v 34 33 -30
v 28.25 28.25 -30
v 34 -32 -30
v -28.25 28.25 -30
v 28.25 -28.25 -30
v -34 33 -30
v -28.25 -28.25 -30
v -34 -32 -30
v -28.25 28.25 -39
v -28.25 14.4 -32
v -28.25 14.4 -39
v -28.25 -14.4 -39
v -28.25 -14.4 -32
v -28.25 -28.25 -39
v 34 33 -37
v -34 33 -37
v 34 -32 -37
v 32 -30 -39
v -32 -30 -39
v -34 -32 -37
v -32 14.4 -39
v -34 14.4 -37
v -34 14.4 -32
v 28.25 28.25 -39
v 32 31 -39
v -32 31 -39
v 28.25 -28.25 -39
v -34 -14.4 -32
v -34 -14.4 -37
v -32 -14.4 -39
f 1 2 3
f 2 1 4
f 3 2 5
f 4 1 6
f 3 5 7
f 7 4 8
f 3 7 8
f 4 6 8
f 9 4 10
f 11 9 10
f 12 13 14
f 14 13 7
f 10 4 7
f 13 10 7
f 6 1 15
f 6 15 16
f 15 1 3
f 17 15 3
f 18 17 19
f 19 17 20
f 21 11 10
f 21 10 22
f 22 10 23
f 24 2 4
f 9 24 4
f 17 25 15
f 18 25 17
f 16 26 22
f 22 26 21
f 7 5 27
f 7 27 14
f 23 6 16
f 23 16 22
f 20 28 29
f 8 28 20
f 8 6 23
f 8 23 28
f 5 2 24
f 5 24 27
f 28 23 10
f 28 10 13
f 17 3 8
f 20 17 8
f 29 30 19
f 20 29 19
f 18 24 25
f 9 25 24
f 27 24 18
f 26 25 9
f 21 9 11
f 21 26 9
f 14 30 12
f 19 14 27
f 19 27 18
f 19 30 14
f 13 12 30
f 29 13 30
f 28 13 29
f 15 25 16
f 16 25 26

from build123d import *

# Parameters (mm, degrees)
BOX331_W                    = 28.8
BOX331_H                    = 43.38
BOX331_DEPTH                = 20
BOX325_W                    = 56.5
BOX325_H                    = 56.5
BOX325_DEPTH                = 40
BOX327_W                    = 65
BOX327_H                    = 68
BOX327_DEPTH                = 9
COMPOUND928_ROLL_ANGLE      = 180
COMPOUND928_PLACEMENT_ANGLE = -90
CHAMFER013_SIZE             = 2


with BuildPart() as krychle331:
    # Box331 → Box331 (new body)
    with BuildSketch(Plane(origin=(-14.4, -8, 34), x_dir=(1, 0, 0), z_dir=(0, 0, 1))):
        with Locations((14.4, 21.69)):
            Rectangle(BOX331_W, BOX331_H)
    extrude(amount=BOX331_DEPTH)


with BuildPart() as krychle325:
    # Box325 → Box325 (new body)
    with BuildSketch(Plane(origin=(-28.25, -28.25, 32), x_dir=(1, 0, 0), z_dir=(0, 0, 1))):
        with Locations((28.25, 28.25)):
            Rectangle(BOX325_W, BOX325_H)
    extrude(amount=BOX325_DEPTH)


with BuildPart() as chamfer013:
    # Box327 → Box327 (new body)
    with BuildSketch(Plane(origin=(-33, -34, 32), x_dir=(1, 0, 0), z_dir=(0, 0, 1))):
        with Locations((32.5, 34)):
            Rectangle(BOX327_W, BOX327_H)
    extrude(amount=BOX327_DEPTH)

    # Cut313: cut Krychle325
    add(krychle325.part, mode=Mode.SUBTRACT)

    # Cut316: cut Krychle331
    add(krychle331.part, mode=Mode.SUBTRACT)


with BuildPart() as chamfer013_1:
    # Cut316 placement: moved
    add(chamfer013.part.moved(Location((-29, 18, 30))))


with BuildPart() as chamfer013_2:
    # Compound928 roll: moved
    add(chamfer013_1.part.rotate(Axis((0, 0, 0), (1, 0, 0)), COMPOUND928_ROLL_ANGLE))


with BuildPart() as chamfer013_3:
    # Compound928 placement: moved
    add(chamfer013_2.part.moved(Location((18, -29, 32))).rotate(Axis((18, -29, 32), (0, 0, 1)), COMPOUND928_PLACEMENT_ANGLE))

    # Chamfer013
    chamfer013_edges = [chamfer013_3.edges().sort_by_distance(p)[0] for p in [
        (0, 33, -39),
        (34, 0.5, -39),
        (-34, 23.7, -39),
        (-34, -23.2, -39),
        (0, -32, -39),
    ]]
    chamfer(chamfer013_edges, length=CHAMFER013_SIZE)


solid = chamfer013_3.part
